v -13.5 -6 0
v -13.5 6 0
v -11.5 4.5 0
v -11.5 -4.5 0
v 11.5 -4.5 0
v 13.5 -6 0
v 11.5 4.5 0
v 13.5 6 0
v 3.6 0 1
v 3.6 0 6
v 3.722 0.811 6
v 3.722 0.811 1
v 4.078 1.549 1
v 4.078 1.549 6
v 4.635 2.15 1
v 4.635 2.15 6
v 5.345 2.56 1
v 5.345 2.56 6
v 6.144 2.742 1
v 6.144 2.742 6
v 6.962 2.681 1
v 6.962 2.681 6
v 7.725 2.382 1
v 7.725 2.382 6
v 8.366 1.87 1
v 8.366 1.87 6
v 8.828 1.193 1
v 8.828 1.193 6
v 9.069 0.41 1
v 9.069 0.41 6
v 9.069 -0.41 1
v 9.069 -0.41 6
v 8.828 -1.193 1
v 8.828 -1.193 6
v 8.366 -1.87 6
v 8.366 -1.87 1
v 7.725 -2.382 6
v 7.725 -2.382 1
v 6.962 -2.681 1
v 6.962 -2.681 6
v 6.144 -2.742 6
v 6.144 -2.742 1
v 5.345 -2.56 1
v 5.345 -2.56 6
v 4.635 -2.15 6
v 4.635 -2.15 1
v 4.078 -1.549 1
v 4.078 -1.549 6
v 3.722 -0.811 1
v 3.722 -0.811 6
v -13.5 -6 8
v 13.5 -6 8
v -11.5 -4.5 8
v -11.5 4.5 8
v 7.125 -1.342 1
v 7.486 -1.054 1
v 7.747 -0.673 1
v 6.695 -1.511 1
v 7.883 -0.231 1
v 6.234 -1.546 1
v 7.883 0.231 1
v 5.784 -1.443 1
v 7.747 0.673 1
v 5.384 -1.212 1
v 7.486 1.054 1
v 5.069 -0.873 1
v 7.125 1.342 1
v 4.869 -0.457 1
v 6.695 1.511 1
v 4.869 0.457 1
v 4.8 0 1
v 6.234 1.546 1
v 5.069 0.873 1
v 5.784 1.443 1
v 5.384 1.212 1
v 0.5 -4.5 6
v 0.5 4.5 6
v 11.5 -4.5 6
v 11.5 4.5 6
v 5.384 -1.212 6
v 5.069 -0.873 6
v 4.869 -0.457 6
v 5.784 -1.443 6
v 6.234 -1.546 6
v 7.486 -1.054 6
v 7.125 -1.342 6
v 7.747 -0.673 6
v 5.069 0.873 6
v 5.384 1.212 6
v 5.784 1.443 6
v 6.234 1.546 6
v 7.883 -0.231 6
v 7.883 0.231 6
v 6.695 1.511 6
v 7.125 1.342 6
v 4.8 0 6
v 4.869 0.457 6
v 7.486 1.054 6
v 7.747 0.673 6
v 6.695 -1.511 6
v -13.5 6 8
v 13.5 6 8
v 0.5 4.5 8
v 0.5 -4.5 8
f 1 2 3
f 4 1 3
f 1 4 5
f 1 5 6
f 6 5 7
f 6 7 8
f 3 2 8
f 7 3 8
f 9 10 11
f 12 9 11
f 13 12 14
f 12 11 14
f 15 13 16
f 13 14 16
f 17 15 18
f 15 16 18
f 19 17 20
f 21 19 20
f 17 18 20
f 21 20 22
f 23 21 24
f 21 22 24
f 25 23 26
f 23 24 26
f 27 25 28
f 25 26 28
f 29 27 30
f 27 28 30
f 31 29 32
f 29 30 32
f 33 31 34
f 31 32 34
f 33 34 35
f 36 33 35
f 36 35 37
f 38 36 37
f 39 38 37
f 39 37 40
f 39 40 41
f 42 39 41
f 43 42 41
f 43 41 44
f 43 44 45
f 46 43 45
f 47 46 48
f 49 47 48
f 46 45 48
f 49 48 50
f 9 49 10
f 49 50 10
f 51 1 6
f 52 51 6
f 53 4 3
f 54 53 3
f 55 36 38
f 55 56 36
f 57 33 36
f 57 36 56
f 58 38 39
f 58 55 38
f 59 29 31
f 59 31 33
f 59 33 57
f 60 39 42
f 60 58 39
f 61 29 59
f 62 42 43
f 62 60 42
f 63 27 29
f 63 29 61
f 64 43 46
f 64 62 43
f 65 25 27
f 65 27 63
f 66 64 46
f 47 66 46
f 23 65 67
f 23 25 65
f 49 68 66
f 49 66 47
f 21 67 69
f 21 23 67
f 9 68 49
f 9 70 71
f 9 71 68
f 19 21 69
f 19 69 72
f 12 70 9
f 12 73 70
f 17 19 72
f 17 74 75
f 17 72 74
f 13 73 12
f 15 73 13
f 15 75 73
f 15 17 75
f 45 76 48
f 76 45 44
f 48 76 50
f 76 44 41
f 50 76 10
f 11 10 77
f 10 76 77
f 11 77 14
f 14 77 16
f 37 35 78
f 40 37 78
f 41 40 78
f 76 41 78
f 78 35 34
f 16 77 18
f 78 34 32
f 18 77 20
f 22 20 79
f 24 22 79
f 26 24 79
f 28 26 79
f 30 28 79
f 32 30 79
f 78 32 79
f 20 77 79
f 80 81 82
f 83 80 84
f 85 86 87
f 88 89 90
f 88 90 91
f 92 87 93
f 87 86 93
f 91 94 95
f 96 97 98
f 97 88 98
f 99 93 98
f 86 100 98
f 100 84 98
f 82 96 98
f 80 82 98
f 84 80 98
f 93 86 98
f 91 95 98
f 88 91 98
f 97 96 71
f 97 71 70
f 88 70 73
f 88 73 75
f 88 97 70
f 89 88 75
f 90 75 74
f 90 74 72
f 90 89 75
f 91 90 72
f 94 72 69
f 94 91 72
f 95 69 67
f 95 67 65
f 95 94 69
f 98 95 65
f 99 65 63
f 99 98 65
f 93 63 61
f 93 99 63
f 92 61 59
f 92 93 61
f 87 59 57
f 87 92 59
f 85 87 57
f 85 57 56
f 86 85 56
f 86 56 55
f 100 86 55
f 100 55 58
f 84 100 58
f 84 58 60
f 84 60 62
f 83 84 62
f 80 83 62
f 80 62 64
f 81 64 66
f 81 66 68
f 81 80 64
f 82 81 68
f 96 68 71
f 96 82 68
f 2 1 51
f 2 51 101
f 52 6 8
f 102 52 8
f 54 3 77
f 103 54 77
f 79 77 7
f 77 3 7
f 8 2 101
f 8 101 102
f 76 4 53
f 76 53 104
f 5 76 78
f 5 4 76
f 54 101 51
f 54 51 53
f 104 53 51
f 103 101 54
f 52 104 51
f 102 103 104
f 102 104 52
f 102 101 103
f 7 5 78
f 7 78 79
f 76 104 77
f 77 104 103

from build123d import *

# Parameters (mm, degrees)
SKETCH_1_W      = 27
SKETCH_1_H      = 12
SKETCH_1_W_2    = 23
SKETCH_1_H_2    = 9
EXTRUDE_1_DEPTH = 8
SKETCH_2_W      = 11
SKETCH_2_H      = 9
EXTRUDE_2_DEPTH = 2
SKETCH_3_R      = 2.75
SKETCH_3_R_2    = 1.55
EXTRUDE_3_DEPTH = 5


with BuildPart() as part:
    # 草图1 → 凸台-拉伸1 (new body)
    with BuildSketch(Plane.XY):
        Rectangle(SKETCH_1_W, SKETCH_1_H)
        Rectangle(SKETCH_1_W_2, SKETCH_1_H_2, mode=Mode.SUBTRACT)
    extrude(amount=EXTRUDE_1_DEPTH)

    # 草图2 → 凸台-拉伸2 (add)
    with BuildSketch(Plane.XY.offset(8)):
        with Locations((6, 0)):
            Rectangle(SKETCH_2_W, SKETCH_2_H)
    extrude(amount=-EXTRUDE_2_DEPTH)

    # 草图3 → 凸台-拉伸3 (add)
    with BuildSketch(Plane(origin=(0, 0, 6), x_dir=(-1, 0, 0), z_dir=(0, 0, -1))):
        with Locations((-6.35, 0)):
            Circle(SKETCH_3_R)
        with Locations((-6.35, 0)):
            Circle(SKETCH_3_R_2, mode=Mode.SUBTRACT)
    extrude(amount=EXTRUDE_3_DEPTH)


solid = part.part
